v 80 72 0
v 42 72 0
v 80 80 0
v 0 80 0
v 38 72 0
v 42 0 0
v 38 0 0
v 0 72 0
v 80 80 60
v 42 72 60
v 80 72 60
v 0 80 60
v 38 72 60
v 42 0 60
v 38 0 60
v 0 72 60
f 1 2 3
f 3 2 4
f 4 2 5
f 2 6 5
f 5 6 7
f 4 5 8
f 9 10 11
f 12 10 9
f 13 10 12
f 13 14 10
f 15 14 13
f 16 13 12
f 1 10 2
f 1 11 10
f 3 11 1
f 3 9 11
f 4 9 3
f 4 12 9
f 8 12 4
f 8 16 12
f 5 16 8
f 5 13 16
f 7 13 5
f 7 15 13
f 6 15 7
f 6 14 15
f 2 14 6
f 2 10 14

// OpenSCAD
$fn = 32;

// ----------------------------------------------------------------------
// Structural section: tee 80 x 80 mm
// ----------------------------------------------------------------------

// --- parameters (mm) ---
sec_w = 80;               // tee width, X
sec_h = 80;               // tee height, Y
flange_t = 8;             // top flange thickness
web_t = 4;                // web thickness
plate_t = 60;             // cut length, Z (extrusion height)
fit_tol = 0.05;           // declared fit tolerance (prompt contract)
free_tol = 0.3;           // declared free tolerance (prompt contract)

profile = [[38, 0], [42, 0], [42, 72], [80, 72], [80, 80], [0, 80], [0, 72], [38, 72]];  // primary outline, 8 points, counter clockwise

// --- the one profile operation ---
linear_extrude(height = plate_t) polygon(points = profile);
